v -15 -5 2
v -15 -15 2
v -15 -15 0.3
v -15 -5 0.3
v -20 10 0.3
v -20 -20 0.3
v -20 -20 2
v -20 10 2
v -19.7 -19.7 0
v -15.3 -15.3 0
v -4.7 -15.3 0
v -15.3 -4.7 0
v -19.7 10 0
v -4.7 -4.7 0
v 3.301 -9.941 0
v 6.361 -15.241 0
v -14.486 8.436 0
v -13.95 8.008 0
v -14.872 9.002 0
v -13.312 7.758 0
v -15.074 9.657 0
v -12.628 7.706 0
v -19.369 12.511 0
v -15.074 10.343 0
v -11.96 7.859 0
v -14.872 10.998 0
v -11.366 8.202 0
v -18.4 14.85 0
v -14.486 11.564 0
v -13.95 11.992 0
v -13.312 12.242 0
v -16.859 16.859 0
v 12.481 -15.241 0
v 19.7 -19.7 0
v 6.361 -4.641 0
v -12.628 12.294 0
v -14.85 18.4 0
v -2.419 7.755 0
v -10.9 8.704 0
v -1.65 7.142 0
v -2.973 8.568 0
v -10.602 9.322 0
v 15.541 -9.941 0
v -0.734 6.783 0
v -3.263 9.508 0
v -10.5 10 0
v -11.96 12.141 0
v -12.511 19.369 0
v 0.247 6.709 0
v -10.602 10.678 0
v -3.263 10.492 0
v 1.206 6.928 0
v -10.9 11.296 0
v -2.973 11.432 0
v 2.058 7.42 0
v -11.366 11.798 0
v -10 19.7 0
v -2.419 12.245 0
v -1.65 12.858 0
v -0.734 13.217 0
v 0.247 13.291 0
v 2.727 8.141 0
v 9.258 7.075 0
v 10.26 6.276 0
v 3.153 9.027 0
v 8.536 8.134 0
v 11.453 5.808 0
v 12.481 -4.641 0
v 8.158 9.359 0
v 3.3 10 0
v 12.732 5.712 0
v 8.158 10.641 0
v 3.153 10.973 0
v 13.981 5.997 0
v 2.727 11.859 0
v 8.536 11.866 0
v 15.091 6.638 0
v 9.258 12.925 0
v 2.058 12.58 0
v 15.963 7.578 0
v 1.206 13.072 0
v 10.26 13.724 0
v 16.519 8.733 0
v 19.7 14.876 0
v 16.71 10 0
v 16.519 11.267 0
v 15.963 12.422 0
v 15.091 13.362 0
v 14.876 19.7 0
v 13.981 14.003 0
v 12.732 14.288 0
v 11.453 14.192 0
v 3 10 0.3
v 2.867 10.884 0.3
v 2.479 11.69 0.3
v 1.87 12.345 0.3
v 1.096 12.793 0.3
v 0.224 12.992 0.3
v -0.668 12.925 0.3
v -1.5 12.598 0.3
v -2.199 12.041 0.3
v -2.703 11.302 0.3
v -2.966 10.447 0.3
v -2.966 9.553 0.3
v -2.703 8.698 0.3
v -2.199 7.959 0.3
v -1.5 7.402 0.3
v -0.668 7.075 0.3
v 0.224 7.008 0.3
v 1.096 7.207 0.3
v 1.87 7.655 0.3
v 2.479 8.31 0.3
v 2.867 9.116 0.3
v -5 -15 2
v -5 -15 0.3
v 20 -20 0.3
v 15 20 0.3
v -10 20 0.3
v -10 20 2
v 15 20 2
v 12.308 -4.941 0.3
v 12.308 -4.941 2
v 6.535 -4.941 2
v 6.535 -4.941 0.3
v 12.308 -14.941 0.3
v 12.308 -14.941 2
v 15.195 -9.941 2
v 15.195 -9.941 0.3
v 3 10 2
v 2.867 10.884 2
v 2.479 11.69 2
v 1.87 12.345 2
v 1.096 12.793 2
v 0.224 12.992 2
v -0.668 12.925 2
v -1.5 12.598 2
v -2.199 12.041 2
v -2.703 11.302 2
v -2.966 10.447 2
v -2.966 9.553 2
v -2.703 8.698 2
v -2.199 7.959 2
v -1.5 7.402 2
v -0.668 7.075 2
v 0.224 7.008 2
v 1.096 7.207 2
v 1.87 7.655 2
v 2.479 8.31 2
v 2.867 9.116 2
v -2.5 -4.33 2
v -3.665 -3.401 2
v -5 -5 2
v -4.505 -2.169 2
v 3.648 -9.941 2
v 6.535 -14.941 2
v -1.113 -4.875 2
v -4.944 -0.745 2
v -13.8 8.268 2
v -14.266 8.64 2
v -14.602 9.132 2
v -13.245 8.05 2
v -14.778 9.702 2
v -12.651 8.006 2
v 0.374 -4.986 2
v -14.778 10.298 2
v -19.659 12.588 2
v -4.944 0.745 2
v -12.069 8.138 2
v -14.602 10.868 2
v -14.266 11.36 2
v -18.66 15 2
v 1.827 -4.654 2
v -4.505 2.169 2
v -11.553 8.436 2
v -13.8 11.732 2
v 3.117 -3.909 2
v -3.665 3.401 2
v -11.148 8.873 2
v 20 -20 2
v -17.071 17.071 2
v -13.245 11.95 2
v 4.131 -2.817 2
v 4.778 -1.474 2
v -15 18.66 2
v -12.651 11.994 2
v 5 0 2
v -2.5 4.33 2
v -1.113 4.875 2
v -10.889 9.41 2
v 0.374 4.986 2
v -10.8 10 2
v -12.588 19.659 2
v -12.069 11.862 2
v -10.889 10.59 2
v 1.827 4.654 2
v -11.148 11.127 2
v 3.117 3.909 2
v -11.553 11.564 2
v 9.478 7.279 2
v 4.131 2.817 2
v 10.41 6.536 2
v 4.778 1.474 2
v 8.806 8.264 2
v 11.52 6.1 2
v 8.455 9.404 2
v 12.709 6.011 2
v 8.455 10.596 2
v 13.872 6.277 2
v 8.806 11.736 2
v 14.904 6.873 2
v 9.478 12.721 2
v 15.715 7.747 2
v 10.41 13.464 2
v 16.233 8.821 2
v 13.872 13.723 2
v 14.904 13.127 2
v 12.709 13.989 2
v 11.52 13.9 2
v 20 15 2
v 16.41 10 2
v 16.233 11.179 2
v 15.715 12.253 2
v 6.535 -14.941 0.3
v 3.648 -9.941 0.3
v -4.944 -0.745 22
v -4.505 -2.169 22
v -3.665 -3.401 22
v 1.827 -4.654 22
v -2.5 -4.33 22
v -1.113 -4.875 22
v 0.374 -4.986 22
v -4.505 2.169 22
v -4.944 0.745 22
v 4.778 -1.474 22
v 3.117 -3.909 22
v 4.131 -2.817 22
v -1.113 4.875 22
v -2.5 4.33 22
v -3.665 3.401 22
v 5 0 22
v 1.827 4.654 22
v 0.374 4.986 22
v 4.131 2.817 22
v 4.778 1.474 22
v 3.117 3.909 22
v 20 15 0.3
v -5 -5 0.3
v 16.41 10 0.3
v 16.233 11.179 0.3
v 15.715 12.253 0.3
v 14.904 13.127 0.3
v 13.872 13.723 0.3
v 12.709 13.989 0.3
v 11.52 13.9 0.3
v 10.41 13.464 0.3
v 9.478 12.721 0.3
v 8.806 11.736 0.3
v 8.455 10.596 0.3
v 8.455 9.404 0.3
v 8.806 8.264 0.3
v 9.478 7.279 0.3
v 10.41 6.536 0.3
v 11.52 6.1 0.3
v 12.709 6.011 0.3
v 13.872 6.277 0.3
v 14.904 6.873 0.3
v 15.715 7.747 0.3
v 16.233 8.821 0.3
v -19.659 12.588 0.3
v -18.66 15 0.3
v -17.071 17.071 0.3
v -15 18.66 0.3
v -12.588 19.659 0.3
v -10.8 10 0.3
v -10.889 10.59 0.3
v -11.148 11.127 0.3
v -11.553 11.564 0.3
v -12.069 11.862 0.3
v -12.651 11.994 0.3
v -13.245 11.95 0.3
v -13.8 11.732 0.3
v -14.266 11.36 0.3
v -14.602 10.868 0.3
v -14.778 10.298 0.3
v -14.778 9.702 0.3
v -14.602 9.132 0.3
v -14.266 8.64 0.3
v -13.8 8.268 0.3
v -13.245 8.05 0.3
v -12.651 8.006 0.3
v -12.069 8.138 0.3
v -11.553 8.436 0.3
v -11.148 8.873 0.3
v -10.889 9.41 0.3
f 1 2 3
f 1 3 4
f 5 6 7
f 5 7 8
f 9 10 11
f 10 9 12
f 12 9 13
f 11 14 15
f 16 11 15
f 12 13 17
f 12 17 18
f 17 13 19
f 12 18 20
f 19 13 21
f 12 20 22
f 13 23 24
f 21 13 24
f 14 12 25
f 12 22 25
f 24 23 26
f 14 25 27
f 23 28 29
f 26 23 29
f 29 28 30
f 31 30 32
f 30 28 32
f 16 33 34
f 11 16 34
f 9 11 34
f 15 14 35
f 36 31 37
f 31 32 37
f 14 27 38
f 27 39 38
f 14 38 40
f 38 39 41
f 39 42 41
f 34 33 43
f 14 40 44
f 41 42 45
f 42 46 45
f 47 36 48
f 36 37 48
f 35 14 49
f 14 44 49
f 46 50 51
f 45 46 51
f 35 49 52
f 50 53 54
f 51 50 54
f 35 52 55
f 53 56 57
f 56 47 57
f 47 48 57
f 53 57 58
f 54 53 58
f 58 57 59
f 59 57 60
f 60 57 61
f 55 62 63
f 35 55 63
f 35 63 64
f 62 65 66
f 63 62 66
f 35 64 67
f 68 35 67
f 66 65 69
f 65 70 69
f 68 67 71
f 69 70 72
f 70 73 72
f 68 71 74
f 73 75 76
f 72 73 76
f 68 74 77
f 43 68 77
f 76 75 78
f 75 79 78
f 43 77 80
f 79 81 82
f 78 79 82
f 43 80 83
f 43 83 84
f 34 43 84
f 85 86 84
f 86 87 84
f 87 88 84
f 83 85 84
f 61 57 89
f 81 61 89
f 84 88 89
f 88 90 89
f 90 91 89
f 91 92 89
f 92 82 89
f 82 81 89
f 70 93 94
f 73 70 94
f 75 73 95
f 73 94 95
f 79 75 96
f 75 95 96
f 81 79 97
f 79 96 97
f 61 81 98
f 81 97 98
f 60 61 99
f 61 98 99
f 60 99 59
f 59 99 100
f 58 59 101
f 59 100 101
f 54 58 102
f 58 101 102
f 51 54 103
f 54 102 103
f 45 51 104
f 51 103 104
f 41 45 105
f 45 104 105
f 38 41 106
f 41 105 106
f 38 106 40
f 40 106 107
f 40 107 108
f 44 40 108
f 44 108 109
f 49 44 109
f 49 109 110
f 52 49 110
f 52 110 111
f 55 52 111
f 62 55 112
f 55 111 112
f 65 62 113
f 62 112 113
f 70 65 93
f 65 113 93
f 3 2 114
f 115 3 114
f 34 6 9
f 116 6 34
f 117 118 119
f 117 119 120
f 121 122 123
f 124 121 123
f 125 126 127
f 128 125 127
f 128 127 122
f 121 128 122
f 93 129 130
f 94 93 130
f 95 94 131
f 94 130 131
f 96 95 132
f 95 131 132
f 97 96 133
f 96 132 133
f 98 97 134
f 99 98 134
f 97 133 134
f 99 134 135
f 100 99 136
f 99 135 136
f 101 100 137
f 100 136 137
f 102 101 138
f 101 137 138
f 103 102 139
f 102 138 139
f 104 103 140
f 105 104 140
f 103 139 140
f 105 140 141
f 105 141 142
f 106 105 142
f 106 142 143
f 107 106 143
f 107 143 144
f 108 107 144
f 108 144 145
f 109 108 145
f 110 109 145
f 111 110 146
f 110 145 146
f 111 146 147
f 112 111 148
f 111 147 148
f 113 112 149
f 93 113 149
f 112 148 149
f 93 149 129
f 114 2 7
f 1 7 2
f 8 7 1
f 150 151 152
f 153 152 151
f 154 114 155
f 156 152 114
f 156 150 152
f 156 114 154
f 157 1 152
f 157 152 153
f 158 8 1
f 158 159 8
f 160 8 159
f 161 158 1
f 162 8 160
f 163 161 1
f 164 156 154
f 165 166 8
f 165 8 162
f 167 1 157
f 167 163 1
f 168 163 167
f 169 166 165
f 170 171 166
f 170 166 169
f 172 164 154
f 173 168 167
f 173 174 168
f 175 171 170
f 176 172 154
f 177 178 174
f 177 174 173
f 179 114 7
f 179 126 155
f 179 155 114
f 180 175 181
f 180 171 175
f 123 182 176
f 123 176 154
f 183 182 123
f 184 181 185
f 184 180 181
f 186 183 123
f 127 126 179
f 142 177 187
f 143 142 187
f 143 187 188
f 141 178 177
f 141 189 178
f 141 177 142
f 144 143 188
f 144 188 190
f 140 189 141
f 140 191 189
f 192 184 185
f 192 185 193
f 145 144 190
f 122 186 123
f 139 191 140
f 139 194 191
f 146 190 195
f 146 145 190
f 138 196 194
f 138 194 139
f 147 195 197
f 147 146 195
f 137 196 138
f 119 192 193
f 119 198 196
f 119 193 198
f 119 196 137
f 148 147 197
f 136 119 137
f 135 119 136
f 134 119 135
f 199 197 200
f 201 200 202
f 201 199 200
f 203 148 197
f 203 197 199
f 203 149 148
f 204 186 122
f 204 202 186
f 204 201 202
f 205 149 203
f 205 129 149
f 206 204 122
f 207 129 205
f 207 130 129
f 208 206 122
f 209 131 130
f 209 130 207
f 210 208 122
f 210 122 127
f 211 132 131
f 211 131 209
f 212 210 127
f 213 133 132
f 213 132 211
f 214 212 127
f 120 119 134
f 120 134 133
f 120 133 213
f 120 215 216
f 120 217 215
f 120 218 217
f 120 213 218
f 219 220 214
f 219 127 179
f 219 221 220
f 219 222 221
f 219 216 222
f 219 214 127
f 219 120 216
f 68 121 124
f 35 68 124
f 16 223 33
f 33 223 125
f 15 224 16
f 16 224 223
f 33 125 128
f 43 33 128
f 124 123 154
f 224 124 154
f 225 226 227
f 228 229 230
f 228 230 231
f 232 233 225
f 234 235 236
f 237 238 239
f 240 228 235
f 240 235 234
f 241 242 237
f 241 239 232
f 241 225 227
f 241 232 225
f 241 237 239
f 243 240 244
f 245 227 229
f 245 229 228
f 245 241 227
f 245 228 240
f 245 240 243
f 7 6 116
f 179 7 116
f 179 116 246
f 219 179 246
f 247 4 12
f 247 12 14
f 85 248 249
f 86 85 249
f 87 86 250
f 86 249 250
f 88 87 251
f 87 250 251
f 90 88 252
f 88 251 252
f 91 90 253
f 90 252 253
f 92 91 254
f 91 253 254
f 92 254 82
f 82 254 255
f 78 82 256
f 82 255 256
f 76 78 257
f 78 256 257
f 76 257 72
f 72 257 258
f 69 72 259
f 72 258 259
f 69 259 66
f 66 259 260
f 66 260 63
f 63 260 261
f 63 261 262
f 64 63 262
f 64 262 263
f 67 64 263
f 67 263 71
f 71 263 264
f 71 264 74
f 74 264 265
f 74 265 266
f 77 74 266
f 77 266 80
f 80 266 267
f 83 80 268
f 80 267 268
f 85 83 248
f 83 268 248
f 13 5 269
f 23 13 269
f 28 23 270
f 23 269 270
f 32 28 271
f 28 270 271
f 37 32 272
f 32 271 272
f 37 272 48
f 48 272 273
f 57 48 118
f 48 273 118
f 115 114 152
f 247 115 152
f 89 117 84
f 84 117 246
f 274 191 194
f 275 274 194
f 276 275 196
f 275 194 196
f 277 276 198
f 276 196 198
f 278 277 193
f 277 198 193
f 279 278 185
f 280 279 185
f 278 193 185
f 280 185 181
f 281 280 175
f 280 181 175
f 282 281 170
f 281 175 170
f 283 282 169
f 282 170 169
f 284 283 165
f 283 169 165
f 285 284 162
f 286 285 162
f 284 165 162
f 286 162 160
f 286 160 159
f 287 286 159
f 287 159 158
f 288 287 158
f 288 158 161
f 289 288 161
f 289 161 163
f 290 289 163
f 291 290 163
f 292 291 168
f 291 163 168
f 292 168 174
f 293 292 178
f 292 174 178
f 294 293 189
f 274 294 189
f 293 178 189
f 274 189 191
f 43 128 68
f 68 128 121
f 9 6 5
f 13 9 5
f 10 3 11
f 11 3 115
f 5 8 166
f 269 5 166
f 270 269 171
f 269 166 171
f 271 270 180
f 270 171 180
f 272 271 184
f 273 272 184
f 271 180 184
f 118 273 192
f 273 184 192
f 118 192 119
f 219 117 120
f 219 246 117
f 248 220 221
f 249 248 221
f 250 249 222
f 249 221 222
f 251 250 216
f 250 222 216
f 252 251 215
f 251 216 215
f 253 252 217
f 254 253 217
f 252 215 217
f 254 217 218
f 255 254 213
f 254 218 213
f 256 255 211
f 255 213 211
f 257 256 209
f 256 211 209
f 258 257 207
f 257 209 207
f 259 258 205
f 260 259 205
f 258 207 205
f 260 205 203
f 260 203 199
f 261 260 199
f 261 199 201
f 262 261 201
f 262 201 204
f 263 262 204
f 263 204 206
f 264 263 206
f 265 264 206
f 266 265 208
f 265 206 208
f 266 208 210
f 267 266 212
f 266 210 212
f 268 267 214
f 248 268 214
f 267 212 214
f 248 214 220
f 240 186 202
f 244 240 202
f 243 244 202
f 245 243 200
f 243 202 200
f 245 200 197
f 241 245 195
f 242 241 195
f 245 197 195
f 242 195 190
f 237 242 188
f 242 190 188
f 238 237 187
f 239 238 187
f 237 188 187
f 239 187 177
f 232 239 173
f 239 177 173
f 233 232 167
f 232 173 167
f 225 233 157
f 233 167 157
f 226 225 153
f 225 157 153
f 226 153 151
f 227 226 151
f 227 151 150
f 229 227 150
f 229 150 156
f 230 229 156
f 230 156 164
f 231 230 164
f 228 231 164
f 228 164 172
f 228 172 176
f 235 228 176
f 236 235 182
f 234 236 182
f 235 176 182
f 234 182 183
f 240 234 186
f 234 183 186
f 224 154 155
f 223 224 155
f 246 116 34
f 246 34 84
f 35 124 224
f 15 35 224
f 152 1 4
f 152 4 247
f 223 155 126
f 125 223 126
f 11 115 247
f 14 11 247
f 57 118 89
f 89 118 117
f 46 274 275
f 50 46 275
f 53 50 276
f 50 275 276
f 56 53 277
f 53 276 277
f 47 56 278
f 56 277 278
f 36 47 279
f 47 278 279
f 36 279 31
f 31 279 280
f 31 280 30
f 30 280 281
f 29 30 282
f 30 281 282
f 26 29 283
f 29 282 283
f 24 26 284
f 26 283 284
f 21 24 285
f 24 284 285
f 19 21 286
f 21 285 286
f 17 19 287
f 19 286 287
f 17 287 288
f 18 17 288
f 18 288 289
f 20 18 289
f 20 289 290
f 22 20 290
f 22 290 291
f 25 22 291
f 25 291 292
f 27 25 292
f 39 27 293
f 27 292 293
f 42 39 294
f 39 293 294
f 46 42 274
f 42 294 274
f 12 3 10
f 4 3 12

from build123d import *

# Parameters (mm, degrees)
F0_W     = 40
F0_H     = 40
F1_DEPTH = 2
F2_R     = 2
F2_R_2   = 3
F2_R_3   = 4
F2_W     = 10
F2_H     = 10
F3_DEPTH = 2
F4_R     = 10
F5_SIZE  = 5
F6_R     = 5
F7_DEPTH = 20
F8_SIZE  = 0.3


with BuildPart() as f1:
    # F0 (on Top) → F1 (new body)
    with BuildSketch(Plane.XY):
        Rectangle(F0_W, F0_H)
    extrude(amount=F1_DEPTH)

    # F2 (on face) → F3 (cut, through all)
    with BuildSketch(Plane.XY.offset(2)):
        with Locations((-12.800124, 10)):
            Circle(F2_R)
        with Locations((0, 10)):
            Circle(F2_R_2)
        with Locations((12.410274, 10)):
            Circle(F2_R_3)
        with Locations((-10, -10)):
            Rectangle(F2_W, F2_H)
        Polygon((12.308161, -4.941213), (6.534659, -4.941213), (3.647907, -9.941213), (6.534659, -14.941213), (12.308161, -14.941213), (15.194913, -9.941213), align=None)
    extrude(amount=-F3_DEPTH, mode=Mode.SUBTRACT)

    # F4
    f4_edges = [f1.edges().sort_by_distance(p)[0] for p in [
        (-20, 20, 1),
    ]]
    fillet(f4_edges, radius=F4_R)

    # F5
    f5_edges = [f1.edges().sort_by_distance(p)[0] for p in [
        (20, 20, 1),
    ]]
    chamfer(f5_edges, length=F5_SIZE)

    # F6 (on face) → F7 (join)
    with BuildSketch(Plane.XY.offset(2)):
        Circle(F6_R)
    extrude(amount=F7_DEPTH)

    # F8
    f8_edges = [f1.edges().sort_by_distance(p)[0] for p in [
        (2.5, 20, 0),
        (17.5, 17.5, 0),
        (-17.071068, 17.071068, 0),
        (20, -2.5, 0),
        (-20, -5, 0),
        (0, -20, 0),
        (-10, -5, 0),
        (-15, -10, 0),
        (-10, -15, 0),
        (-5, -10, 0),
        (9.42141, -4.941213, 0),
        (5.091283, -7.441213, 0),
        (5.091283, -12.441213, 0),
        (9.42141, -14.941213, 0),
        (13.751537, -12.441213, 0),
        (13.751537, -7.441213, 0),
        (-14.800124, 10, 0),
        (-3, 10, 0),
        (8.410274, 10, 0),
    ]]
    chamfer(f8_edges, length=F8_SIZE)


solid = f1.part
